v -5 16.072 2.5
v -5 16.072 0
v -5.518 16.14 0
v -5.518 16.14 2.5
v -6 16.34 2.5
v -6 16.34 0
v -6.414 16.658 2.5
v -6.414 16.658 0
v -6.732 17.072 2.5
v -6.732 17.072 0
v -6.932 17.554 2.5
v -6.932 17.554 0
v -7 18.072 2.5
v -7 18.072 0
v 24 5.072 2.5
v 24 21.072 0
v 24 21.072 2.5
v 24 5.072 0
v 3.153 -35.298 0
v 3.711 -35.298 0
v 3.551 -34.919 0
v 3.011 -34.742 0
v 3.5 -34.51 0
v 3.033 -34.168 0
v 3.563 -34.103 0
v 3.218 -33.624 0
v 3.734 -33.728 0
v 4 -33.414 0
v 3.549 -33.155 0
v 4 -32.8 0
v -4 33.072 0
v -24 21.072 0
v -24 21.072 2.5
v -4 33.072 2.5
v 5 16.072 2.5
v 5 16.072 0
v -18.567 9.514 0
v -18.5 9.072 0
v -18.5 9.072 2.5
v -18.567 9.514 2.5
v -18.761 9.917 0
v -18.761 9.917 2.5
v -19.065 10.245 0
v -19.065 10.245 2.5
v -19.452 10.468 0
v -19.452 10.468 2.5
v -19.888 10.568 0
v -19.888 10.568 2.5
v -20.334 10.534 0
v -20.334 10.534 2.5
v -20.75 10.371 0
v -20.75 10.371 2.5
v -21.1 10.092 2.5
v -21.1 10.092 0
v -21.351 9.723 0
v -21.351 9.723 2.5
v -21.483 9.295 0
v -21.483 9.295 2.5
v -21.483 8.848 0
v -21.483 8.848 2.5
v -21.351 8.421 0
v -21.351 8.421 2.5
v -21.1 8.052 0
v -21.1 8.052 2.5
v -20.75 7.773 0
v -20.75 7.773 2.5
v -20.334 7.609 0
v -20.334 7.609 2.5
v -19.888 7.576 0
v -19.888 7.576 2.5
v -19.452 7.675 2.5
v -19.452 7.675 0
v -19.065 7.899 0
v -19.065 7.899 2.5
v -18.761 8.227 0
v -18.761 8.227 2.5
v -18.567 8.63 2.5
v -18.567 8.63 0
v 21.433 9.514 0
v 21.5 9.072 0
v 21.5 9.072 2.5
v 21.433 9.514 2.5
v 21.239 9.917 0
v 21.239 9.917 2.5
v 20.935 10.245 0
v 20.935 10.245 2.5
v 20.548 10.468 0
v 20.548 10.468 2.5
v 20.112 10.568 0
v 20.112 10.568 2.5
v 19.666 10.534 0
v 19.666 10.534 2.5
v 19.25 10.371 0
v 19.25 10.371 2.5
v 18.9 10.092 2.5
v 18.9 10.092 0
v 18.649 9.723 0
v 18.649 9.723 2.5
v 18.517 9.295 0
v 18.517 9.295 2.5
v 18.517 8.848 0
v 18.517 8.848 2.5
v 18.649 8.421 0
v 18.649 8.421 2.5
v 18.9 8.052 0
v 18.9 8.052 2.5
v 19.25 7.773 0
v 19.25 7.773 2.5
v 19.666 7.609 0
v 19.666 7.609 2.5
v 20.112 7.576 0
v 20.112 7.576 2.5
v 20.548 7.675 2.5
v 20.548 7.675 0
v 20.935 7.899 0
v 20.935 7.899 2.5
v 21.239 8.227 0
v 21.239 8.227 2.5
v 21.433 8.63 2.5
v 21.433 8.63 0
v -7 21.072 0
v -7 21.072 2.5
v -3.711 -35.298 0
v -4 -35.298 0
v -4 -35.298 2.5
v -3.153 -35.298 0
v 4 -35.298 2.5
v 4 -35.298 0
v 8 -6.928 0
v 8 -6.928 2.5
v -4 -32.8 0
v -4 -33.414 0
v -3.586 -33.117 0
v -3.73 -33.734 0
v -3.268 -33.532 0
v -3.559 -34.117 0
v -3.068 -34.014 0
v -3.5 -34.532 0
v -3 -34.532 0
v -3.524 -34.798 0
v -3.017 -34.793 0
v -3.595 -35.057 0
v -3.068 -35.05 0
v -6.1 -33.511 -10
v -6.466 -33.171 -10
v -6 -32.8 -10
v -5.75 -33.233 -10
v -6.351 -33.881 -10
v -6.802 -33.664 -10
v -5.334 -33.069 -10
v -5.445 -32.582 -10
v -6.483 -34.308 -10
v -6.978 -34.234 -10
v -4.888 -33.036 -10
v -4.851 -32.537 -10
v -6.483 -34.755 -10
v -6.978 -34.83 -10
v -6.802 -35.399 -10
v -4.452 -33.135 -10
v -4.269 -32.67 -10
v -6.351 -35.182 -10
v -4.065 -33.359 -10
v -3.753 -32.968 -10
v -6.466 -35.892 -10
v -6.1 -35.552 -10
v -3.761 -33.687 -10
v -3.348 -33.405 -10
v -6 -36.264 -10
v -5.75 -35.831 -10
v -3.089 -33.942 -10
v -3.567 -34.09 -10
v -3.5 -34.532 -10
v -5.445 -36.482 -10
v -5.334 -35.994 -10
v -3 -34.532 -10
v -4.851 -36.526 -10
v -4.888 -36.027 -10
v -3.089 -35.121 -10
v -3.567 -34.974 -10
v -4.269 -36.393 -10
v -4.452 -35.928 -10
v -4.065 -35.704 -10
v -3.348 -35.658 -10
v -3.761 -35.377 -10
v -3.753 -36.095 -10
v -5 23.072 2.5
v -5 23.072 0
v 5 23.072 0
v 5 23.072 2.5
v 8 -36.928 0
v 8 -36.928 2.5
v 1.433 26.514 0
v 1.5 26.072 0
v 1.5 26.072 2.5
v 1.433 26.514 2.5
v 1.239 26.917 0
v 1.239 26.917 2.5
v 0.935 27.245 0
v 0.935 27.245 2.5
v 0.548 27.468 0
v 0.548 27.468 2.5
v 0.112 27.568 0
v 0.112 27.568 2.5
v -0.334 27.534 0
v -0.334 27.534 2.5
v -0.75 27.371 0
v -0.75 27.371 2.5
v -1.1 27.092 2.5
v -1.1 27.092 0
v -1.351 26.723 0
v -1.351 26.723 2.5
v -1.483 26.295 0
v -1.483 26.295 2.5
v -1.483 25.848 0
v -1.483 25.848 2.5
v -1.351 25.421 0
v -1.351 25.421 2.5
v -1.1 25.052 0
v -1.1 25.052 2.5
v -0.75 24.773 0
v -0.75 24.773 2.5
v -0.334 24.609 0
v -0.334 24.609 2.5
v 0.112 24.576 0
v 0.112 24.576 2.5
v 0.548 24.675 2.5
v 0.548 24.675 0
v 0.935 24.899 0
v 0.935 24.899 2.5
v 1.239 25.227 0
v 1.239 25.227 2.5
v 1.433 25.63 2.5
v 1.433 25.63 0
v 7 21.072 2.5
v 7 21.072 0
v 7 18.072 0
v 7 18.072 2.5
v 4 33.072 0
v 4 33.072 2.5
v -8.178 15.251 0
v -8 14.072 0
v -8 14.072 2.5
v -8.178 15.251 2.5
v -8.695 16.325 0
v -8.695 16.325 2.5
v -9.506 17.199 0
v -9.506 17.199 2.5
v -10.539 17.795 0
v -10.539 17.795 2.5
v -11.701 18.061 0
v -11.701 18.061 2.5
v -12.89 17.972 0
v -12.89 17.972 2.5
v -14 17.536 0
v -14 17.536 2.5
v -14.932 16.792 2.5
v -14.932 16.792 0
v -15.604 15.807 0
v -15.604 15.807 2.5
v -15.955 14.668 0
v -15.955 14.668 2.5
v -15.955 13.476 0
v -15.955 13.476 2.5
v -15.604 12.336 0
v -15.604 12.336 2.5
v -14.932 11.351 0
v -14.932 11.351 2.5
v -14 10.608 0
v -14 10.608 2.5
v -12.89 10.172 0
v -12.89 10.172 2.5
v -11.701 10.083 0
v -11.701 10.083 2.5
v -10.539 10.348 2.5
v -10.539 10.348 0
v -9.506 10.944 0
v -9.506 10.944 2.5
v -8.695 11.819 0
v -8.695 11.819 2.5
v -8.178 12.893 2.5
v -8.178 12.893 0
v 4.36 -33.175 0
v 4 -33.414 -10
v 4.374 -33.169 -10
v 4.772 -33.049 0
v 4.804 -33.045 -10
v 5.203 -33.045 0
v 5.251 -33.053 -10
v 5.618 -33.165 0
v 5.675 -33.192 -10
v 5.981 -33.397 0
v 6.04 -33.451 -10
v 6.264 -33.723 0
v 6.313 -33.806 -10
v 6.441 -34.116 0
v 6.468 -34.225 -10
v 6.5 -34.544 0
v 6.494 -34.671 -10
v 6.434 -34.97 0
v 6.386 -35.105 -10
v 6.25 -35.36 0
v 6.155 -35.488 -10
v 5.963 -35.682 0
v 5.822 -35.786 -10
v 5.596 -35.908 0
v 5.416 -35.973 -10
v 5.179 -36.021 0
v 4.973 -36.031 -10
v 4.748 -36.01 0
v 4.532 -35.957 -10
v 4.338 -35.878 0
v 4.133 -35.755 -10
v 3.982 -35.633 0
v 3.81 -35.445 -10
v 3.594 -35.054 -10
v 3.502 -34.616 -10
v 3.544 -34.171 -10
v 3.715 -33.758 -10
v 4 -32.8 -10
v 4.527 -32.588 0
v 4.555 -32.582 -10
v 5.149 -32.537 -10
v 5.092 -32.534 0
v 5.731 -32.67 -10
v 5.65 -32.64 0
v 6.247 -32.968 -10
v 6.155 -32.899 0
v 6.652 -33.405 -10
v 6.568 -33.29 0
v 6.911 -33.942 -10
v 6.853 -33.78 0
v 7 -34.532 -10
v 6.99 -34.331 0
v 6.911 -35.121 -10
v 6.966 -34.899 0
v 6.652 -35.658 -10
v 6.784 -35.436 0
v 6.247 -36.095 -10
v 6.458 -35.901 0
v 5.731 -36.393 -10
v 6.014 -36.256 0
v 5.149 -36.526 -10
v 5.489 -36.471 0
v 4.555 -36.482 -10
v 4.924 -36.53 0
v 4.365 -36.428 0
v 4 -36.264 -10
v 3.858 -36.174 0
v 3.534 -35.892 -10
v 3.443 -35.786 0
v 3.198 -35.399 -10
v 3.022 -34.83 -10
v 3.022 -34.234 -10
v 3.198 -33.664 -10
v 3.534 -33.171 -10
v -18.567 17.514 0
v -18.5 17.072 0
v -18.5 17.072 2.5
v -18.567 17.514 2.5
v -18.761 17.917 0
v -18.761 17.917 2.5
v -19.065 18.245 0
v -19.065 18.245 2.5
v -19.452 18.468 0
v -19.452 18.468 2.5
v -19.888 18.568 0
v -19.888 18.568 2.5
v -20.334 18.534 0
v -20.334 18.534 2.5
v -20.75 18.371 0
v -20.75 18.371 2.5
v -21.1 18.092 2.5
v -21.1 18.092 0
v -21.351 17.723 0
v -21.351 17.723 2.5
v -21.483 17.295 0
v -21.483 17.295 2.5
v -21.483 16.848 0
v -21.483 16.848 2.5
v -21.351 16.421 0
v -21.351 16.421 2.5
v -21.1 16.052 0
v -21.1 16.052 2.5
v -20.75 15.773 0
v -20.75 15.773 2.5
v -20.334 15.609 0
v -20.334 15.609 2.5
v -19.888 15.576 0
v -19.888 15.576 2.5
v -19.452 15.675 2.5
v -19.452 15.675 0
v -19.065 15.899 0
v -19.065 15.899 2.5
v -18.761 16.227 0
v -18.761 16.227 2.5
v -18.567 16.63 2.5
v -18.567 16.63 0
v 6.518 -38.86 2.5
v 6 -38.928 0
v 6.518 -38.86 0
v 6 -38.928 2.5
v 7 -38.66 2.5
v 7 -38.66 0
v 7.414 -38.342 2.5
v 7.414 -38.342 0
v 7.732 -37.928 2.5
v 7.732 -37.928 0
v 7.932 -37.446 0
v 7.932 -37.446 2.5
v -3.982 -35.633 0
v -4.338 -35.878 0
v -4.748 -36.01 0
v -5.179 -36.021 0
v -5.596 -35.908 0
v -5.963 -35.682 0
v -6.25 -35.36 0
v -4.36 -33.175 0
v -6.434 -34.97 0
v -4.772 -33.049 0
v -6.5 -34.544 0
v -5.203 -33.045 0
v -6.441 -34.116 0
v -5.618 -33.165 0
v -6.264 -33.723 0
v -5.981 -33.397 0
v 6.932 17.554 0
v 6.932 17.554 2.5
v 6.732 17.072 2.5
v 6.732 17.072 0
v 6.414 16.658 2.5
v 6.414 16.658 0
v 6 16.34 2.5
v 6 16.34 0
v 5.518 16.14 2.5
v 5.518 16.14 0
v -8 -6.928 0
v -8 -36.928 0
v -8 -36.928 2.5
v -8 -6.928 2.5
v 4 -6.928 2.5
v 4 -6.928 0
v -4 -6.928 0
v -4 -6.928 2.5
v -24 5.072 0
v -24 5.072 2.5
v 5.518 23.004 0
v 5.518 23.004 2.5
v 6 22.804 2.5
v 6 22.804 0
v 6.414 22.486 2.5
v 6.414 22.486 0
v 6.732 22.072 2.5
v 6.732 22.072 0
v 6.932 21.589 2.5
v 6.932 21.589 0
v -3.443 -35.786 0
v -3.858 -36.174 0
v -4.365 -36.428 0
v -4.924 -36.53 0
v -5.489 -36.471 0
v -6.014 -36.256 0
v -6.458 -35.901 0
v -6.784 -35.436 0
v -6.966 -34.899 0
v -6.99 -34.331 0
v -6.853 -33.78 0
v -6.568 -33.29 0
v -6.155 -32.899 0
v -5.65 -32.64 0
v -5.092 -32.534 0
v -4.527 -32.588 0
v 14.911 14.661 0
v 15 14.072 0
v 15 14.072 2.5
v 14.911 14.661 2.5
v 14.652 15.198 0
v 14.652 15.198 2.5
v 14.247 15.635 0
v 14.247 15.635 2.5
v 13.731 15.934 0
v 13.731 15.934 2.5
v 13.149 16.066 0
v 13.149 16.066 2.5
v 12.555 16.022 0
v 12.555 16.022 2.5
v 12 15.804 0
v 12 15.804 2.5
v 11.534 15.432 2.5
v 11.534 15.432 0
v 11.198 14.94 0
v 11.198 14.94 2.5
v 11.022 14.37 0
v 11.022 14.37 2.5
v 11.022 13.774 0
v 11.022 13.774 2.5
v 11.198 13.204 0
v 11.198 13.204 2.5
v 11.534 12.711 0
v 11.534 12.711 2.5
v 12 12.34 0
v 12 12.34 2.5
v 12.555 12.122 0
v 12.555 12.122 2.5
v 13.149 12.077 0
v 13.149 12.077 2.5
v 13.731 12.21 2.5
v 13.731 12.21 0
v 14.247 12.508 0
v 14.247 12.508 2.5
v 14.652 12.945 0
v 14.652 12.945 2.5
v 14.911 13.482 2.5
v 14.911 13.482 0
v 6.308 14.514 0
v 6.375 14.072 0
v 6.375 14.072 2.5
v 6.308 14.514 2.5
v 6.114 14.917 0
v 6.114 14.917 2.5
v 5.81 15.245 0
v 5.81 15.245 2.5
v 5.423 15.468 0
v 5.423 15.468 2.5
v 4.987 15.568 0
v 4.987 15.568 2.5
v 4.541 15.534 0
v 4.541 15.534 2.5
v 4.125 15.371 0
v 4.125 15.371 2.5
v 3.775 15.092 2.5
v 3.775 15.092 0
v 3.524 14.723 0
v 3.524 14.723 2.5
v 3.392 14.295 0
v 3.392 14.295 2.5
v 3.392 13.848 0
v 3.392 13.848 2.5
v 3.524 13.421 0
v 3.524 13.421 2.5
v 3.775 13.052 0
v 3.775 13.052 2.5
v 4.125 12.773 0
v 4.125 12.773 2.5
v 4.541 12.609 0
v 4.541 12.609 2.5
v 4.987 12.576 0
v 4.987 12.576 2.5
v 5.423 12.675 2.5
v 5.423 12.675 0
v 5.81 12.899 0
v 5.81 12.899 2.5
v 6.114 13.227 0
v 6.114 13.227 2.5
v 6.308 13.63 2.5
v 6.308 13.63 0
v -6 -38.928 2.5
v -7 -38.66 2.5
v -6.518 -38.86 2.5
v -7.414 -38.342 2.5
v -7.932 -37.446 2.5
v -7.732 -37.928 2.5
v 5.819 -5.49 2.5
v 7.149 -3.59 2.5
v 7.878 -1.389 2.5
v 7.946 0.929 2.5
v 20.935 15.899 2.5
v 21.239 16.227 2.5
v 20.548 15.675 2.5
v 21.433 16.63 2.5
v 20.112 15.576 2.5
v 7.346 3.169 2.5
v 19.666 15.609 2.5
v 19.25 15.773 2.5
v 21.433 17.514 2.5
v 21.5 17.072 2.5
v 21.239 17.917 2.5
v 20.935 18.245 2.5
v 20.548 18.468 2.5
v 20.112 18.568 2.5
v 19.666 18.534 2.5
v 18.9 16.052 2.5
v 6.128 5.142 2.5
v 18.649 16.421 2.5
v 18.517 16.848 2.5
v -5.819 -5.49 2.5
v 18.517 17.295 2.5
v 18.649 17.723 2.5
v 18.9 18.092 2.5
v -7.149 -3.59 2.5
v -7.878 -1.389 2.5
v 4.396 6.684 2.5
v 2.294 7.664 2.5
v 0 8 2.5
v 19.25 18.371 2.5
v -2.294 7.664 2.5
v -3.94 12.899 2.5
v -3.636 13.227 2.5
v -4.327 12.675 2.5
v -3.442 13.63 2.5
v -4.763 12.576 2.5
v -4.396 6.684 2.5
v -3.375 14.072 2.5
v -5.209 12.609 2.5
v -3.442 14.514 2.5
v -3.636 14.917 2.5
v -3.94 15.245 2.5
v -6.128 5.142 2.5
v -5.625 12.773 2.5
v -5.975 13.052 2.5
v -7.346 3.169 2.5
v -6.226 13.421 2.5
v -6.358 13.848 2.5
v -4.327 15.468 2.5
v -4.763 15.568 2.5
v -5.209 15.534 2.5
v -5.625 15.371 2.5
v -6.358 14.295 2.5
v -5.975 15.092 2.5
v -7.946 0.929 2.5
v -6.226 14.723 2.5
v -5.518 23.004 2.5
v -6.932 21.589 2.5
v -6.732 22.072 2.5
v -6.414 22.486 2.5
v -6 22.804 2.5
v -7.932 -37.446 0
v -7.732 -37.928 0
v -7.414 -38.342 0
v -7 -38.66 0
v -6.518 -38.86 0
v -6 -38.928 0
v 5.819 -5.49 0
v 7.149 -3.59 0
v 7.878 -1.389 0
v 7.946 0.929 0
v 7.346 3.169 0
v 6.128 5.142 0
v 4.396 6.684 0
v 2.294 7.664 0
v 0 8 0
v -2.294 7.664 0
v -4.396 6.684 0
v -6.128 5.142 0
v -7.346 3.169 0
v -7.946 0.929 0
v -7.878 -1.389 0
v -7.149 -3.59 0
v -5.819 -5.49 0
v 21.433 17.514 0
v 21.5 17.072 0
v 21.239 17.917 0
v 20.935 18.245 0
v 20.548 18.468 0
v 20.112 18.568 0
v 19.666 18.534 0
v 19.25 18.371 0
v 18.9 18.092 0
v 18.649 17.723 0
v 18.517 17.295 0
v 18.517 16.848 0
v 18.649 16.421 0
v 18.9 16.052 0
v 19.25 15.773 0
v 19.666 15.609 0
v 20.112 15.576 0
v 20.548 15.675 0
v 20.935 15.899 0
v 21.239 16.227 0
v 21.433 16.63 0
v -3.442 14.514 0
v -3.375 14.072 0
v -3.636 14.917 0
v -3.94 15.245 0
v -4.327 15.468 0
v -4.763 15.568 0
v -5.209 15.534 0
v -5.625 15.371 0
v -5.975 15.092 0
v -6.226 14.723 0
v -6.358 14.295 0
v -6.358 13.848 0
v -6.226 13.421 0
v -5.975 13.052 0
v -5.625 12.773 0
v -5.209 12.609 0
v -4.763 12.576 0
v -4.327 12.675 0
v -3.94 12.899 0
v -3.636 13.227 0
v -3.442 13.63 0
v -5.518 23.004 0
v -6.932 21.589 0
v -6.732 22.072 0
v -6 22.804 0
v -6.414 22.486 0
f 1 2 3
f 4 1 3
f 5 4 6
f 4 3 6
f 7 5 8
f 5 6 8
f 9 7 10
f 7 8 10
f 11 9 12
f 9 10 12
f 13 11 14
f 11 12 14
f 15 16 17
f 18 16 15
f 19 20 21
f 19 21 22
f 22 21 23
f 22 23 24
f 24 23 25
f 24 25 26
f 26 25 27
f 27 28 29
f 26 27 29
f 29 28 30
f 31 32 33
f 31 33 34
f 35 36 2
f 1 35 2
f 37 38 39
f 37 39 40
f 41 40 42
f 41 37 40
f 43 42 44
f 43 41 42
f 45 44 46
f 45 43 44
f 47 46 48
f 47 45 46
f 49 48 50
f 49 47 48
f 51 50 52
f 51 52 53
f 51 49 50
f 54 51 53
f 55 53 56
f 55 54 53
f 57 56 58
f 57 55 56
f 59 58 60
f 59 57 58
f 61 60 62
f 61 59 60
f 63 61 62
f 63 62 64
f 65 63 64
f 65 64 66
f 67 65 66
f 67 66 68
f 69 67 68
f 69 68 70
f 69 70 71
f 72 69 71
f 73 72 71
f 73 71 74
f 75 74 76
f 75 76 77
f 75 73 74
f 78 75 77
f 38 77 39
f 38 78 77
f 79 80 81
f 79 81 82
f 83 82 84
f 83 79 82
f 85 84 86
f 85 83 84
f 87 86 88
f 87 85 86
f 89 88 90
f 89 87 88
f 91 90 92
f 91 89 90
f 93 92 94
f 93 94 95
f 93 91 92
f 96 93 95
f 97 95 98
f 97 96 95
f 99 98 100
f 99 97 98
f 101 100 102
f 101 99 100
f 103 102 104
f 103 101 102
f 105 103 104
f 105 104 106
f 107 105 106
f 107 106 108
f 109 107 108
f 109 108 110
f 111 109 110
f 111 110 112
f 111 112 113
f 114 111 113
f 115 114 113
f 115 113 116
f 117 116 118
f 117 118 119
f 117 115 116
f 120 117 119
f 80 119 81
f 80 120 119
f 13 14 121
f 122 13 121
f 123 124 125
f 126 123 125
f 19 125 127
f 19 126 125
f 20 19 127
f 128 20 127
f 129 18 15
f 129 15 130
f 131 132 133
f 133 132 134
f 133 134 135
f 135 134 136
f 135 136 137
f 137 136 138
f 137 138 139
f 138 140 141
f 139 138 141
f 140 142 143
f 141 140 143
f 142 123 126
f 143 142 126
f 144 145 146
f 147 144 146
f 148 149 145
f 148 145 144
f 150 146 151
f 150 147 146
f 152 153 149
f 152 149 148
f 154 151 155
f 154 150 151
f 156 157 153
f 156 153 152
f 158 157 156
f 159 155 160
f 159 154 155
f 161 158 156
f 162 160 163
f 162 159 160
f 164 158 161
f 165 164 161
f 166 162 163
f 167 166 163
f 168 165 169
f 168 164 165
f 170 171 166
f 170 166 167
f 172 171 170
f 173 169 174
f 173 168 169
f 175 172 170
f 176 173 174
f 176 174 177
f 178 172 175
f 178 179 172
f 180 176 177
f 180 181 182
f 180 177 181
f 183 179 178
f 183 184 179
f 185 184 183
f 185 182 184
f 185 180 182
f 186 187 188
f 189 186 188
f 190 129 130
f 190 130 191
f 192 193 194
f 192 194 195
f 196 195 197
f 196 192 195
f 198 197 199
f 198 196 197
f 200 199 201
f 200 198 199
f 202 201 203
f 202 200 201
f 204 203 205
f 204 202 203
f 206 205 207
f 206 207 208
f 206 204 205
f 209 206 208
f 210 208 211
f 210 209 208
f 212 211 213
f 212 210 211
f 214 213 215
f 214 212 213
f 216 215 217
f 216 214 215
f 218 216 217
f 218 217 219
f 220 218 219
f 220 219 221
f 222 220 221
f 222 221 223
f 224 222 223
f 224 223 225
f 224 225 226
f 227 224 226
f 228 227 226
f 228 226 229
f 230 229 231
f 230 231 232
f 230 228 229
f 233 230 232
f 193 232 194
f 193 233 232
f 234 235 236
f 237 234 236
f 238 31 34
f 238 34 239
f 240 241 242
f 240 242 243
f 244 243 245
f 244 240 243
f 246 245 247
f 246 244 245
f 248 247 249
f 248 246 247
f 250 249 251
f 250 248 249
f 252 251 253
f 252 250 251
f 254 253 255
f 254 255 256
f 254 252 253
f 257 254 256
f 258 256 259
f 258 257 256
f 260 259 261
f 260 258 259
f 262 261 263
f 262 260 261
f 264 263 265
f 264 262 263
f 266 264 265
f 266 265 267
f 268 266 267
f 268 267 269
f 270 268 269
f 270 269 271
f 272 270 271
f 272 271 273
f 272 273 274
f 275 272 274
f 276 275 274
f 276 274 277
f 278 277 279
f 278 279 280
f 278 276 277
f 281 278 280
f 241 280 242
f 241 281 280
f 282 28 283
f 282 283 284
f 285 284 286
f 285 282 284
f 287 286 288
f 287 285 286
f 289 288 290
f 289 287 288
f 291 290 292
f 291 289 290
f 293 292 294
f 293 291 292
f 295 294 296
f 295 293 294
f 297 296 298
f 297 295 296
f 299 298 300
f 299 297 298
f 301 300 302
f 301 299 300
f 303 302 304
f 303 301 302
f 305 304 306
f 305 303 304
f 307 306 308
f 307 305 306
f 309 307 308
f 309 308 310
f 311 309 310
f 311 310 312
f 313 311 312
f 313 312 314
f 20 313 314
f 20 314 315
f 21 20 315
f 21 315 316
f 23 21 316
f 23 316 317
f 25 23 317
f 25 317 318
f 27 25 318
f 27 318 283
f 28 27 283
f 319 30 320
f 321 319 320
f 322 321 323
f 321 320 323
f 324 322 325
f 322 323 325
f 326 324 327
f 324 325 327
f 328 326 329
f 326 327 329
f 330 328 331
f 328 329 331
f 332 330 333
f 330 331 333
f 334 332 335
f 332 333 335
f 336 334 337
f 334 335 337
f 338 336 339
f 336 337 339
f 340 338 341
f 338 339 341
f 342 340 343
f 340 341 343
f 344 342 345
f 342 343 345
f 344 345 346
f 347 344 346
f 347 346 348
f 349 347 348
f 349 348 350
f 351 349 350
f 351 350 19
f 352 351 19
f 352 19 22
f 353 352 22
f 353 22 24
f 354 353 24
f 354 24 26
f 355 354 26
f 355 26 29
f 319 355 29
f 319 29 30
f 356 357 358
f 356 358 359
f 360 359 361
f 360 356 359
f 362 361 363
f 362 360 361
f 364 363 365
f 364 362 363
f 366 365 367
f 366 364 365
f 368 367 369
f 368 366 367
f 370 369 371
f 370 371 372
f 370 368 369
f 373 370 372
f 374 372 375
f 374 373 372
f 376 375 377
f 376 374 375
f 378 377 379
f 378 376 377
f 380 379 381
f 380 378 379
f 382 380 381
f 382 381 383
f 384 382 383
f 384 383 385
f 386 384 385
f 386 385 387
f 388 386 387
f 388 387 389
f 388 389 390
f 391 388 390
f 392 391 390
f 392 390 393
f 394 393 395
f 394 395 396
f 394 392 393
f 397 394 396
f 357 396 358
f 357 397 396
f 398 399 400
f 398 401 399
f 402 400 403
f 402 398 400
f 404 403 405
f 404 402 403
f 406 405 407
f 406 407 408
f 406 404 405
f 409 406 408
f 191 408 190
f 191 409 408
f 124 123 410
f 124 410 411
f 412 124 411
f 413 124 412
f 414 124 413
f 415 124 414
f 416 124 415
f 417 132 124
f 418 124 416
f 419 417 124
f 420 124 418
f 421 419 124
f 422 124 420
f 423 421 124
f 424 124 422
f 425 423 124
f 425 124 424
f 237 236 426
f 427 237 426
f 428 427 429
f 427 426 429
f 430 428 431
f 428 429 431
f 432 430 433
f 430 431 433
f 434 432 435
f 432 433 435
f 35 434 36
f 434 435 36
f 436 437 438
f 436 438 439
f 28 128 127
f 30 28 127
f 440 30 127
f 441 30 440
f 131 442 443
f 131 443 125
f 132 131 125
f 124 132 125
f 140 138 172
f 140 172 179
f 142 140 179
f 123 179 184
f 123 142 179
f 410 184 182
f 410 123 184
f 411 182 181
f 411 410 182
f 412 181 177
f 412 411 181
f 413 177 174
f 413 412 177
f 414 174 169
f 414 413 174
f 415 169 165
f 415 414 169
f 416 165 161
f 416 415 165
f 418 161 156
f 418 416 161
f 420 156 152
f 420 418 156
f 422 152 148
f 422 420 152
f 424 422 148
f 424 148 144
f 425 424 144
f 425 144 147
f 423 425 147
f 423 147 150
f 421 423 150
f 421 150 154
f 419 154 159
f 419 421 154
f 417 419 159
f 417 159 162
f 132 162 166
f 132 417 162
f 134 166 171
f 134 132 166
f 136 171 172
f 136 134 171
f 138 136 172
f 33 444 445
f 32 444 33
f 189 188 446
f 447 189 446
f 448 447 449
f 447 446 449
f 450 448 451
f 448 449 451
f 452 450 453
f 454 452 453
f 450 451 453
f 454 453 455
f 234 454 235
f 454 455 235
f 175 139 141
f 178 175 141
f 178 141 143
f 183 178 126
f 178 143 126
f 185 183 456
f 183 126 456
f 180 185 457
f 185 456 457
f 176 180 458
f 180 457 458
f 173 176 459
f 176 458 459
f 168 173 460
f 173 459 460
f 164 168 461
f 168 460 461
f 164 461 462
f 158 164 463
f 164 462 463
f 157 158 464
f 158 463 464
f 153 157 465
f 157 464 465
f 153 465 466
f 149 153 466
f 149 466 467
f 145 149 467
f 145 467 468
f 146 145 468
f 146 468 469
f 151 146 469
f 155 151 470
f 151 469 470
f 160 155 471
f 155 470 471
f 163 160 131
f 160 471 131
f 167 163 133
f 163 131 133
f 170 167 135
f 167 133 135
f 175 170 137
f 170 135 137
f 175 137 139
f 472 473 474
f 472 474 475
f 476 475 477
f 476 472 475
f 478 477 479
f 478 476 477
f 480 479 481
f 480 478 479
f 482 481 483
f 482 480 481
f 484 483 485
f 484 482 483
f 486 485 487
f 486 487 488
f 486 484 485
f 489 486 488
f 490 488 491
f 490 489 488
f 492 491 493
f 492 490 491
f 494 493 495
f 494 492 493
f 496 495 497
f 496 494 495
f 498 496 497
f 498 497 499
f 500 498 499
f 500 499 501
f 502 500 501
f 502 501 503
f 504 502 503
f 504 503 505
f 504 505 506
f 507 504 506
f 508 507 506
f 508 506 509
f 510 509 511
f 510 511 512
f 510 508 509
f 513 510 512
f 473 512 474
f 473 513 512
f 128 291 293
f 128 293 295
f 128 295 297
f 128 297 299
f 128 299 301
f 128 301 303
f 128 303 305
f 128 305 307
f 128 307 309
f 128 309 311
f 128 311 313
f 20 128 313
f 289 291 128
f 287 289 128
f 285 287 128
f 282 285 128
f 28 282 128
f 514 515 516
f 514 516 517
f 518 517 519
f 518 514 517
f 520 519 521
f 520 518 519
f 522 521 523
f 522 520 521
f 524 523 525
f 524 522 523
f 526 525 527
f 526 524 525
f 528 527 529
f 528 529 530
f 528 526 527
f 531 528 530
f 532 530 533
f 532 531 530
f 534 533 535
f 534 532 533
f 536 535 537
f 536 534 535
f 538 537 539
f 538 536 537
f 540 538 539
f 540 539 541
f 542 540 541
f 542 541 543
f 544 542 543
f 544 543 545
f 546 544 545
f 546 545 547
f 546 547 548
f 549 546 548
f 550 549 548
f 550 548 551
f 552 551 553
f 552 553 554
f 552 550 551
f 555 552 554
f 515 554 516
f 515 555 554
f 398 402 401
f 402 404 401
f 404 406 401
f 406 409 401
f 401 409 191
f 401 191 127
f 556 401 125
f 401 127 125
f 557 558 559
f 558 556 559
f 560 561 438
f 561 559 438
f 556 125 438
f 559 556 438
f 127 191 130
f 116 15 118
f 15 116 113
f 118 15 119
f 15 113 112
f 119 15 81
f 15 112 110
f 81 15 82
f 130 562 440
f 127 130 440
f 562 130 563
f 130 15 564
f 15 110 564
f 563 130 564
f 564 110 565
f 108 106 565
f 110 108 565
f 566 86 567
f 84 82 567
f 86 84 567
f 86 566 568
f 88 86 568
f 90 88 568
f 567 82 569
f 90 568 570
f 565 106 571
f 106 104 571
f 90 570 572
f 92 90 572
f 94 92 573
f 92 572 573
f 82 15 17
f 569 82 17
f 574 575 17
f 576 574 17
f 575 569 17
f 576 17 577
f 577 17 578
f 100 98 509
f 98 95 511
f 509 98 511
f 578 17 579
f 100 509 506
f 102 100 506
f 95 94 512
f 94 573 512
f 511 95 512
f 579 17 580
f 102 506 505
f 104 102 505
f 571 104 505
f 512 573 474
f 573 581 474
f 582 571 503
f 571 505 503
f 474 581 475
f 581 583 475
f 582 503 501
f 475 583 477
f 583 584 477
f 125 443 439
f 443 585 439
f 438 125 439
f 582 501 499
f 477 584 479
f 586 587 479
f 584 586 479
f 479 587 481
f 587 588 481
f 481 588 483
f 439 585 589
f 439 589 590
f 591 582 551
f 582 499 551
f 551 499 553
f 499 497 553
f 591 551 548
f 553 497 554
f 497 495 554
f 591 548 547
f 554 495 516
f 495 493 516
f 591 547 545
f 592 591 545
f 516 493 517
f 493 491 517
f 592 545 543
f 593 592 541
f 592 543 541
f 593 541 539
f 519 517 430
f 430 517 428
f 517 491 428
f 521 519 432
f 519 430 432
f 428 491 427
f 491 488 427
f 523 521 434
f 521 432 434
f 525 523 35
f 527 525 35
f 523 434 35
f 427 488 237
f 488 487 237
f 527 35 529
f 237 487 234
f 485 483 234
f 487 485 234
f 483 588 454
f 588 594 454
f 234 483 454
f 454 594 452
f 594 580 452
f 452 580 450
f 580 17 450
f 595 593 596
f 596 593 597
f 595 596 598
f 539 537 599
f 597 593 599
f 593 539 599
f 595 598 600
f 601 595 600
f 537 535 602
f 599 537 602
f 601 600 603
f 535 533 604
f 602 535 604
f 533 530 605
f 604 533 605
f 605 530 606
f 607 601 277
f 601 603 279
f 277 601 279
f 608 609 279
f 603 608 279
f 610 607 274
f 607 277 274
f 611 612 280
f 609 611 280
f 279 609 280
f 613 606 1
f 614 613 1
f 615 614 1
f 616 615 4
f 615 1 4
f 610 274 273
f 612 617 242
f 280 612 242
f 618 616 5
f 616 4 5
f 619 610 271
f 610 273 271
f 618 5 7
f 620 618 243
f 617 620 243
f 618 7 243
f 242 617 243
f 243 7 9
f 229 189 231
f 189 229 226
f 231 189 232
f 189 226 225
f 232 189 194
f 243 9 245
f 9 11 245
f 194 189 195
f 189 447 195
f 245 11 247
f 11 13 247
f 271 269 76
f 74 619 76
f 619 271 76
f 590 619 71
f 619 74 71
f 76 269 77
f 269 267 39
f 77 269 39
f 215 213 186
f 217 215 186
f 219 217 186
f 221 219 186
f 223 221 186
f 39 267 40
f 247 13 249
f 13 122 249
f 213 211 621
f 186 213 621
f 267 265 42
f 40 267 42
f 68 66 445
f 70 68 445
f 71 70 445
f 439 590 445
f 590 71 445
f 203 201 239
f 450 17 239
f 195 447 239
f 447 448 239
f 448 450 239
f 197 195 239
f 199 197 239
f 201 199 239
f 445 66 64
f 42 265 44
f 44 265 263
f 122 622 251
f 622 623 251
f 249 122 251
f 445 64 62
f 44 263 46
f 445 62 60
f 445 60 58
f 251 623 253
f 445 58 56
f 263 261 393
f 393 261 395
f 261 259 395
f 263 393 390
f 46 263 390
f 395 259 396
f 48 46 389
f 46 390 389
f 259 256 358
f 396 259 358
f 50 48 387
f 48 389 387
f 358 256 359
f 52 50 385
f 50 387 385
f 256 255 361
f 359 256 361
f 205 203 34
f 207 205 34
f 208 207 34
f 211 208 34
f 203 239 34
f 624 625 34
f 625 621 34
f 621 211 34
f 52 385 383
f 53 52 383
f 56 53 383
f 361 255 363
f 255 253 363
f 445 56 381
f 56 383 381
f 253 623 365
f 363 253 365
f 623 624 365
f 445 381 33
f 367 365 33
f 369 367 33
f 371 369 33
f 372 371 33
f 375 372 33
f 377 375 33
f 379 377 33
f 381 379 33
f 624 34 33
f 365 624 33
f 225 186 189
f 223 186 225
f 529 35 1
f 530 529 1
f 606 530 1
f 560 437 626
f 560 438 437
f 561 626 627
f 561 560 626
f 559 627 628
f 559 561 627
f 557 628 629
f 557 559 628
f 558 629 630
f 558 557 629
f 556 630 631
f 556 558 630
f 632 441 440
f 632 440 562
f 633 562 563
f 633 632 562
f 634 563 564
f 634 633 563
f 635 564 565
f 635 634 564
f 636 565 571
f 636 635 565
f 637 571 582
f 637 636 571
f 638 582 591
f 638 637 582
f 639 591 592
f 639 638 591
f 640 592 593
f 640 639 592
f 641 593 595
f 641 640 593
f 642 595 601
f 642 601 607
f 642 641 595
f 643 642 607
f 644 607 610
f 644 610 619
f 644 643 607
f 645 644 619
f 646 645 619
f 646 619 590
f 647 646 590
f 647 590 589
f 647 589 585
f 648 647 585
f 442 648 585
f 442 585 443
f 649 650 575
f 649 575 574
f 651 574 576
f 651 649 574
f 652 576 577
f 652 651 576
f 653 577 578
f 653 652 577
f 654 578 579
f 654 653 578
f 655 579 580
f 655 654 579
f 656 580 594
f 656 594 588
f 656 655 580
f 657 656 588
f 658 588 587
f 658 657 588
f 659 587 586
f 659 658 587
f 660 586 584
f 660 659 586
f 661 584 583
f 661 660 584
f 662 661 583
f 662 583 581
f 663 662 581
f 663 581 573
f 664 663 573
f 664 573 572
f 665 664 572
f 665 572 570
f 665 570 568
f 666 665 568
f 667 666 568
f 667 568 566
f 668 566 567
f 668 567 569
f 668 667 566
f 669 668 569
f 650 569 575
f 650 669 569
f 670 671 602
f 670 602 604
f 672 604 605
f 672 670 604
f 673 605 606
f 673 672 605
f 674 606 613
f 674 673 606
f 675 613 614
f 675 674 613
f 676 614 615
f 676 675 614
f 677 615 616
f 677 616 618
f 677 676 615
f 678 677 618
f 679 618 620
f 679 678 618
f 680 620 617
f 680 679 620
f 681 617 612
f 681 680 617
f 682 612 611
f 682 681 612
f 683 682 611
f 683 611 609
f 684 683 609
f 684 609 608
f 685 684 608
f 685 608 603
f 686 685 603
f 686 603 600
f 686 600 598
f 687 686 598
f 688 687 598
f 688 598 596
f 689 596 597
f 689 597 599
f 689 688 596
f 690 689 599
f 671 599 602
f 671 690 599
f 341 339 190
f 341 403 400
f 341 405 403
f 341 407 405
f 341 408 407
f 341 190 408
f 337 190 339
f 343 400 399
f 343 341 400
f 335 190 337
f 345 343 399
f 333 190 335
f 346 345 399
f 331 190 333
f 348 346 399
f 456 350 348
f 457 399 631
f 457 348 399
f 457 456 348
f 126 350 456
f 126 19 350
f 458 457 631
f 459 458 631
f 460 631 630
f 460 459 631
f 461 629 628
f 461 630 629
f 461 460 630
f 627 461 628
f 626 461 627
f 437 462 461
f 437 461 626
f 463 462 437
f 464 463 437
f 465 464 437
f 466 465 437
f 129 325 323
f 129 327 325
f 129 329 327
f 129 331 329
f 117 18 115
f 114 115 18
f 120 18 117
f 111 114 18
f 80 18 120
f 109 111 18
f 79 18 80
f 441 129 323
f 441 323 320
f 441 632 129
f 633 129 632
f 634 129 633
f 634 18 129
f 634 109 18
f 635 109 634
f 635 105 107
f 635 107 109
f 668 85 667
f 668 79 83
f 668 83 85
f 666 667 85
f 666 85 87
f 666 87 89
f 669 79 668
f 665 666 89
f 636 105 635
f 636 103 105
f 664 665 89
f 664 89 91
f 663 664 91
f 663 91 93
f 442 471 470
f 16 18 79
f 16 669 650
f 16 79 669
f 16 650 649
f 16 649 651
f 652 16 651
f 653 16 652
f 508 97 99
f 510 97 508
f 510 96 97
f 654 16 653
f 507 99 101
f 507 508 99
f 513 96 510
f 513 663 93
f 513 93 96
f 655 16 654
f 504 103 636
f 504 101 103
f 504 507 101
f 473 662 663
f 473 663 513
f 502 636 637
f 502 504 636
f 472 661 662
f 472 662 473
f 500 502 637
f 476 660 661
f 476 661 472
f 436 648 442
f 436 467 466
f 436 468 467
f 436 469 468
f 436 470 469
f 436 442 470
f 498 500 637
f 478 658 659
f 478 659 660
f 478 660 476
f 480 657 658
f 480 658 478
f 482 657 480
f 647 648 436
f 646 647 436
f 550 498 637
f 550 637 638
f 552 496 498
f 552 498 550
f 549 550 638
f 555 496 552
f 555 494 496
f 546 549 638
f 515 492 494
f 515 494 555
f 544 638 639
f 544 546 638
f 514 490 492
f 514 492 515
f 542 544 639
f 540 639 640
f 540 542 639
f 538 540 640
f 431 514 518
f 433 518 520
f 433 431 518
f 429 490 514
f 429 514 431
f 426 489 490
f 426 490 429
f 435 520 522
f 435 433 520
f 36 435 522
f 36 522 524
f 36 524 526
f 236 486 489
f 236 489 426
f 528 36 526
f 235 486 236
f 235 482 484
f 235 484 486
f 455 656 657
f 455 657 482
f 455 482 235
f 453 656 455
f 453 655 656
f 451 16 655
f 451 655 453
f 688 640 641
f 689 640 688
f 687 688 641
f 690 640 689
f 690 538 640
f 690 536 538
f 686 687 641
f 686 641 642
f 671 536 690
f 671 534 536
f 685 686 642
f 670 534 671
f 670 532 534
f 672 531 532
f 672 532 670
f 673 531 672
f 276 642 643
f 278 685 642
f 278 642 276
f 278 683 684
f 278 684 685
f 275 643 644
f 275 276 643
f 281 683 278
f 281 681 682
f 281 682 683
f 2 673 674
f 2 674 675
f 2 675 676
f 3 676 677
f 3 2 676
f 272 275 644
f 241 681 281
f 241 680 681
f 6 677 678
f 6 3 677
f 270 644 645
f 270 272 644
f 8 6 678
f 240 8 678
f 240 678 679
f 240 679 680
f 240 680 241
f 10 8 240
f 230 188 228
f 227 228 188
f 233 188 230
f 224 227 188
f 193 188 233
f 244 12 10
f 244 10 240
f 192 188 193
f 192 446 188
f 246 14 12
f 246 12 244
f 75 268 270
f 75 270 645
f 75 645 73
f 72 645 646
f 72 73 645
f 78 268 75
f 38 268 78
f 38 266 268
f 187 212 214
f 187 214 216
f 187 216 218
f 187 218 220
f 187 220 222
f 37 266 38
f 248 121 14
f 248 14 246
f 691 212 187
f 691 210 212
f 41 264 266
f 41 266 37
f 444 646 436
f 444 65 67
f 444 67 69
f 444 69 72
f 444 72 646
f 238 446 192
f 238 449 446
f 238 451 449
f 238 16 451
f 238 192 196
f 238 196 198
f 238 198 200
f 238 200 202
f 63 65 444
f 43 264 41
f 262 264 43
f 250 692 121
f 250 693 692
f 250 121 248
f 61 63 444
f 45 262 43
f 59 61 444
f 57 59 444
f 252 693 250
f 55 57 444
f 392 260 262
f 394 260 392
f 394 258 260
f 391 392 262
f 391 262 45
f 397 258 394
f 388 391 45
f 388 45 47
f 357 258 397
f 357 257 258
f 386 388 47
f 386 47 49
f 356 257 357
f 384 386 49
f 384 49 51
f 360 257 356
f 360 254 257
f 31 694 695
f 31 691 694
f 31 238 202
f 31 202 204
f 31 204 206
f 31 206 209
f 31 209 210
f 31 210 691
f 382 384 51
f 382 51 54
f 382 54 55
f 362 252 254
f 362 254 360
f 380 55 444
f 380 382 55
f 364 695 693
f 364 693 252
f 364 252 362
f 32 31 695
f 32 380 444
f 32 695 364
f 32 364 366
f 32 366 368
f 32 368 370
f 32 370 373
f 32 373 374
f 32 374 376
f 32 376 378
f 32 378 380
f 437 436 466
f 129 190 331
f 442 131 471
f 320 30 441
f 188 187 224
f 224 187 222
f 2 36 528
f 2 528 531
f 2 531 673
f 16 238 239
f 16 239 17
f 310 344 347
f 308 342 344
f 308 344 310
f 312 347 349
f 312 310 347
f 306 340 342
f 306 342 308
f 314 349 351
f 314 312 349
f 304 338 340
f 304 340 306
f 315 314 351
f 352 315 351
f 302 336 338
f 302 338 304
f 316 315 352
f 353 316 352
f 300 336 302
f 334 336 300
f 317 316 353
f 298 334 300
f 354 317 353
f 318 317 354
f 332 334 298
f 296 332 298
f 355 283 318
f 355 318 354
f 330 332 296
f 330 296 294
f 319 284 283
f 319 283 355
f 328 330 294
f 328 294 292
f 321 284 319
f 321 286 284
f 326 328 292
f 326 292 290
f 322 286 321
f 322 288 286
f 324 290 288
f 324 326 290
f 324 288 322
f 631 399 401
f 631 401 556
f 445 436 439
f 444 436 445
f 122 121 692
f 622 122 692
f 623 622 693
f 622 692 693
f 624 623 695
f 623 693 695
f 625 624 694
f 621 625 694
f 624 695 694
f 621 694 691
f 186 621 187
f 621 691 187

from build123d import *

# Parameters (mm, degrees)
SKETCH1_R           = 4
SKETCH1_R_2         = 1.5
SKETCH1_R_3         = 2
BOSS_EXTRUDE1_DEPTH = 2.5
SKETCH2_R           = 2
SKETCH2_R_2         = 1.5
BOSS_EXTRUDE2_DEPTH = 10
FILLET1_R           = 2


with BuildPart() as part:
    # Sketch1 → Boss-Extrude1 (new body)
    with BuildSketch(Plane.XY):
        Polygon((-24, 5.07179677), (-24, 21.07179677), (-4, 33.07179677), (4, 33.07179677), (24, 21.07179677), (24, 5.07179677), (8, -6.92820323), (8, -38.92820323), (-8, -38.92820323), (-8, -6.92820323), align=None)
        with Locations((-12, 14.07179677)):
            Circle(SKETCH1_R, mode=Mode.SUBTRACT)
        with Locations((-4.875, 14.07179677)):
            Circle(SKETCH1_R_2, mode=Mode.SUBTRACT)
        with Locations((4.875, 14.07179677)):
            Circle(SKETCH1_R_2, mode=Mode.SUBTRACT)
        with Locations((0, 26.07179677)):
            Circle(SKETCH1_R_2, mode=Mode.SUBTRACT)
        with Locations((20, 17.07179677)):
            Circle(SKETCH1_R_2, mode=Mode.SUBTRACT)
        with Locations((20, 9.07179677)):
            Circle(SKETCH1_R_2, mode=Mode.SUBTRACT)
        with Locations((-20, 17.07179677)):
            Circle(SKETCH1_R_2, mode=Mode.SUBTRACT)
        with Locations((-20, 9.07179677)):
            Circle(SKETCH1_R_2, mode=Mode.SUBTRACT)
        with Locations((13, 14.07179677)):
            Circle(SKETCH1_R_3, mode=Mode.SUBTRACT)
        with BuildLine():
            Line((-4, -35.29820323), (4, -35.29820323))
            Line((4, -35.29820323), (4, -6.92820323))
            ThreePointArc((4, -6.92820323), (0, 8), (-4, -6.92820323))
            Line((-4, -6.92820323), (-4, -35.29820323))
        make_face(mode=Mode.SUBTRACT)
        with BuildLine():
            Line((-5, 23.07179677), (5, 23.07179677))
            ThreePointArc((5, 23.07179677), (6.414213562, 22.486010332), (7, 21.07179677))
            Line((7, 21.07179677), (7, 18.07179677))
            ThreePointArc((7, 18.07179677), (6.414213562, 16.657583207), (5, 16.07179677))
            Line((5, 16.07179677), (-5, 16.07179677))
            ThreePointArc((-5, 16.07179677), (-6.414213562, 16.657583207), (-7, 18.07179677))
            Line((-7, 18.07179677), (-7, 21.07179677))
            ThreePointArc((-7, 21.07179677), (-6.414213562, 22.486010332), (-5, 23.07179677))
        make_face(mode=Mode.SUBTRACT)
    extrude(amount=BOSS_EXTRUDE1_DEPTH)

    # Sketch2 → Boss-Extrude2 (add)
    # profile 1 of 2: a face of its own
    with BuildSketch(Plane(origin=(0, 0, 0), x_dir=(-1, 0, 0), z_dir=(0, 0, -1))):
        with Locations(Location((-5, -34.53164975, 0), (0, 0, 60))):
            Circle(SKETCH2_R)
        with Locations(Location((-5, -34.53164975, 0), (0, 0, 48.189685104))):
            Circle(SKETCH2_R_2, mode=Mode.SUBTRACT)
    # profile 2 of 2: a face of its own
    with BuildSketch(Plane(origin=(0, 0, 0), x_dir=(-1, 0, 0), z_dir=(0, 0, -1))):
        with Locations(Location((5, -34.53164975, 0), (0, 0, 180))):
            Circle(SKETCH2_R)
        with Locations(Location((5, -34.53164975, 0), (0, 0, 180))):
            Circle(SKETCH2_R_2, mode=Mode.SUBTRACT)
    extrude(amount=BOSS_EXTRUDE2_DEPTH)

    # Fillet1
    fillet1_edges = [part.edges().sort_by_distance(p)[0] for p in [
        (8, -38.92820323, 1.25),
        (-8, -38.92820323, 1.25),
    ]]
    fillet(fillet1_edges, radius=FILLET1_R)


solid = part.part
